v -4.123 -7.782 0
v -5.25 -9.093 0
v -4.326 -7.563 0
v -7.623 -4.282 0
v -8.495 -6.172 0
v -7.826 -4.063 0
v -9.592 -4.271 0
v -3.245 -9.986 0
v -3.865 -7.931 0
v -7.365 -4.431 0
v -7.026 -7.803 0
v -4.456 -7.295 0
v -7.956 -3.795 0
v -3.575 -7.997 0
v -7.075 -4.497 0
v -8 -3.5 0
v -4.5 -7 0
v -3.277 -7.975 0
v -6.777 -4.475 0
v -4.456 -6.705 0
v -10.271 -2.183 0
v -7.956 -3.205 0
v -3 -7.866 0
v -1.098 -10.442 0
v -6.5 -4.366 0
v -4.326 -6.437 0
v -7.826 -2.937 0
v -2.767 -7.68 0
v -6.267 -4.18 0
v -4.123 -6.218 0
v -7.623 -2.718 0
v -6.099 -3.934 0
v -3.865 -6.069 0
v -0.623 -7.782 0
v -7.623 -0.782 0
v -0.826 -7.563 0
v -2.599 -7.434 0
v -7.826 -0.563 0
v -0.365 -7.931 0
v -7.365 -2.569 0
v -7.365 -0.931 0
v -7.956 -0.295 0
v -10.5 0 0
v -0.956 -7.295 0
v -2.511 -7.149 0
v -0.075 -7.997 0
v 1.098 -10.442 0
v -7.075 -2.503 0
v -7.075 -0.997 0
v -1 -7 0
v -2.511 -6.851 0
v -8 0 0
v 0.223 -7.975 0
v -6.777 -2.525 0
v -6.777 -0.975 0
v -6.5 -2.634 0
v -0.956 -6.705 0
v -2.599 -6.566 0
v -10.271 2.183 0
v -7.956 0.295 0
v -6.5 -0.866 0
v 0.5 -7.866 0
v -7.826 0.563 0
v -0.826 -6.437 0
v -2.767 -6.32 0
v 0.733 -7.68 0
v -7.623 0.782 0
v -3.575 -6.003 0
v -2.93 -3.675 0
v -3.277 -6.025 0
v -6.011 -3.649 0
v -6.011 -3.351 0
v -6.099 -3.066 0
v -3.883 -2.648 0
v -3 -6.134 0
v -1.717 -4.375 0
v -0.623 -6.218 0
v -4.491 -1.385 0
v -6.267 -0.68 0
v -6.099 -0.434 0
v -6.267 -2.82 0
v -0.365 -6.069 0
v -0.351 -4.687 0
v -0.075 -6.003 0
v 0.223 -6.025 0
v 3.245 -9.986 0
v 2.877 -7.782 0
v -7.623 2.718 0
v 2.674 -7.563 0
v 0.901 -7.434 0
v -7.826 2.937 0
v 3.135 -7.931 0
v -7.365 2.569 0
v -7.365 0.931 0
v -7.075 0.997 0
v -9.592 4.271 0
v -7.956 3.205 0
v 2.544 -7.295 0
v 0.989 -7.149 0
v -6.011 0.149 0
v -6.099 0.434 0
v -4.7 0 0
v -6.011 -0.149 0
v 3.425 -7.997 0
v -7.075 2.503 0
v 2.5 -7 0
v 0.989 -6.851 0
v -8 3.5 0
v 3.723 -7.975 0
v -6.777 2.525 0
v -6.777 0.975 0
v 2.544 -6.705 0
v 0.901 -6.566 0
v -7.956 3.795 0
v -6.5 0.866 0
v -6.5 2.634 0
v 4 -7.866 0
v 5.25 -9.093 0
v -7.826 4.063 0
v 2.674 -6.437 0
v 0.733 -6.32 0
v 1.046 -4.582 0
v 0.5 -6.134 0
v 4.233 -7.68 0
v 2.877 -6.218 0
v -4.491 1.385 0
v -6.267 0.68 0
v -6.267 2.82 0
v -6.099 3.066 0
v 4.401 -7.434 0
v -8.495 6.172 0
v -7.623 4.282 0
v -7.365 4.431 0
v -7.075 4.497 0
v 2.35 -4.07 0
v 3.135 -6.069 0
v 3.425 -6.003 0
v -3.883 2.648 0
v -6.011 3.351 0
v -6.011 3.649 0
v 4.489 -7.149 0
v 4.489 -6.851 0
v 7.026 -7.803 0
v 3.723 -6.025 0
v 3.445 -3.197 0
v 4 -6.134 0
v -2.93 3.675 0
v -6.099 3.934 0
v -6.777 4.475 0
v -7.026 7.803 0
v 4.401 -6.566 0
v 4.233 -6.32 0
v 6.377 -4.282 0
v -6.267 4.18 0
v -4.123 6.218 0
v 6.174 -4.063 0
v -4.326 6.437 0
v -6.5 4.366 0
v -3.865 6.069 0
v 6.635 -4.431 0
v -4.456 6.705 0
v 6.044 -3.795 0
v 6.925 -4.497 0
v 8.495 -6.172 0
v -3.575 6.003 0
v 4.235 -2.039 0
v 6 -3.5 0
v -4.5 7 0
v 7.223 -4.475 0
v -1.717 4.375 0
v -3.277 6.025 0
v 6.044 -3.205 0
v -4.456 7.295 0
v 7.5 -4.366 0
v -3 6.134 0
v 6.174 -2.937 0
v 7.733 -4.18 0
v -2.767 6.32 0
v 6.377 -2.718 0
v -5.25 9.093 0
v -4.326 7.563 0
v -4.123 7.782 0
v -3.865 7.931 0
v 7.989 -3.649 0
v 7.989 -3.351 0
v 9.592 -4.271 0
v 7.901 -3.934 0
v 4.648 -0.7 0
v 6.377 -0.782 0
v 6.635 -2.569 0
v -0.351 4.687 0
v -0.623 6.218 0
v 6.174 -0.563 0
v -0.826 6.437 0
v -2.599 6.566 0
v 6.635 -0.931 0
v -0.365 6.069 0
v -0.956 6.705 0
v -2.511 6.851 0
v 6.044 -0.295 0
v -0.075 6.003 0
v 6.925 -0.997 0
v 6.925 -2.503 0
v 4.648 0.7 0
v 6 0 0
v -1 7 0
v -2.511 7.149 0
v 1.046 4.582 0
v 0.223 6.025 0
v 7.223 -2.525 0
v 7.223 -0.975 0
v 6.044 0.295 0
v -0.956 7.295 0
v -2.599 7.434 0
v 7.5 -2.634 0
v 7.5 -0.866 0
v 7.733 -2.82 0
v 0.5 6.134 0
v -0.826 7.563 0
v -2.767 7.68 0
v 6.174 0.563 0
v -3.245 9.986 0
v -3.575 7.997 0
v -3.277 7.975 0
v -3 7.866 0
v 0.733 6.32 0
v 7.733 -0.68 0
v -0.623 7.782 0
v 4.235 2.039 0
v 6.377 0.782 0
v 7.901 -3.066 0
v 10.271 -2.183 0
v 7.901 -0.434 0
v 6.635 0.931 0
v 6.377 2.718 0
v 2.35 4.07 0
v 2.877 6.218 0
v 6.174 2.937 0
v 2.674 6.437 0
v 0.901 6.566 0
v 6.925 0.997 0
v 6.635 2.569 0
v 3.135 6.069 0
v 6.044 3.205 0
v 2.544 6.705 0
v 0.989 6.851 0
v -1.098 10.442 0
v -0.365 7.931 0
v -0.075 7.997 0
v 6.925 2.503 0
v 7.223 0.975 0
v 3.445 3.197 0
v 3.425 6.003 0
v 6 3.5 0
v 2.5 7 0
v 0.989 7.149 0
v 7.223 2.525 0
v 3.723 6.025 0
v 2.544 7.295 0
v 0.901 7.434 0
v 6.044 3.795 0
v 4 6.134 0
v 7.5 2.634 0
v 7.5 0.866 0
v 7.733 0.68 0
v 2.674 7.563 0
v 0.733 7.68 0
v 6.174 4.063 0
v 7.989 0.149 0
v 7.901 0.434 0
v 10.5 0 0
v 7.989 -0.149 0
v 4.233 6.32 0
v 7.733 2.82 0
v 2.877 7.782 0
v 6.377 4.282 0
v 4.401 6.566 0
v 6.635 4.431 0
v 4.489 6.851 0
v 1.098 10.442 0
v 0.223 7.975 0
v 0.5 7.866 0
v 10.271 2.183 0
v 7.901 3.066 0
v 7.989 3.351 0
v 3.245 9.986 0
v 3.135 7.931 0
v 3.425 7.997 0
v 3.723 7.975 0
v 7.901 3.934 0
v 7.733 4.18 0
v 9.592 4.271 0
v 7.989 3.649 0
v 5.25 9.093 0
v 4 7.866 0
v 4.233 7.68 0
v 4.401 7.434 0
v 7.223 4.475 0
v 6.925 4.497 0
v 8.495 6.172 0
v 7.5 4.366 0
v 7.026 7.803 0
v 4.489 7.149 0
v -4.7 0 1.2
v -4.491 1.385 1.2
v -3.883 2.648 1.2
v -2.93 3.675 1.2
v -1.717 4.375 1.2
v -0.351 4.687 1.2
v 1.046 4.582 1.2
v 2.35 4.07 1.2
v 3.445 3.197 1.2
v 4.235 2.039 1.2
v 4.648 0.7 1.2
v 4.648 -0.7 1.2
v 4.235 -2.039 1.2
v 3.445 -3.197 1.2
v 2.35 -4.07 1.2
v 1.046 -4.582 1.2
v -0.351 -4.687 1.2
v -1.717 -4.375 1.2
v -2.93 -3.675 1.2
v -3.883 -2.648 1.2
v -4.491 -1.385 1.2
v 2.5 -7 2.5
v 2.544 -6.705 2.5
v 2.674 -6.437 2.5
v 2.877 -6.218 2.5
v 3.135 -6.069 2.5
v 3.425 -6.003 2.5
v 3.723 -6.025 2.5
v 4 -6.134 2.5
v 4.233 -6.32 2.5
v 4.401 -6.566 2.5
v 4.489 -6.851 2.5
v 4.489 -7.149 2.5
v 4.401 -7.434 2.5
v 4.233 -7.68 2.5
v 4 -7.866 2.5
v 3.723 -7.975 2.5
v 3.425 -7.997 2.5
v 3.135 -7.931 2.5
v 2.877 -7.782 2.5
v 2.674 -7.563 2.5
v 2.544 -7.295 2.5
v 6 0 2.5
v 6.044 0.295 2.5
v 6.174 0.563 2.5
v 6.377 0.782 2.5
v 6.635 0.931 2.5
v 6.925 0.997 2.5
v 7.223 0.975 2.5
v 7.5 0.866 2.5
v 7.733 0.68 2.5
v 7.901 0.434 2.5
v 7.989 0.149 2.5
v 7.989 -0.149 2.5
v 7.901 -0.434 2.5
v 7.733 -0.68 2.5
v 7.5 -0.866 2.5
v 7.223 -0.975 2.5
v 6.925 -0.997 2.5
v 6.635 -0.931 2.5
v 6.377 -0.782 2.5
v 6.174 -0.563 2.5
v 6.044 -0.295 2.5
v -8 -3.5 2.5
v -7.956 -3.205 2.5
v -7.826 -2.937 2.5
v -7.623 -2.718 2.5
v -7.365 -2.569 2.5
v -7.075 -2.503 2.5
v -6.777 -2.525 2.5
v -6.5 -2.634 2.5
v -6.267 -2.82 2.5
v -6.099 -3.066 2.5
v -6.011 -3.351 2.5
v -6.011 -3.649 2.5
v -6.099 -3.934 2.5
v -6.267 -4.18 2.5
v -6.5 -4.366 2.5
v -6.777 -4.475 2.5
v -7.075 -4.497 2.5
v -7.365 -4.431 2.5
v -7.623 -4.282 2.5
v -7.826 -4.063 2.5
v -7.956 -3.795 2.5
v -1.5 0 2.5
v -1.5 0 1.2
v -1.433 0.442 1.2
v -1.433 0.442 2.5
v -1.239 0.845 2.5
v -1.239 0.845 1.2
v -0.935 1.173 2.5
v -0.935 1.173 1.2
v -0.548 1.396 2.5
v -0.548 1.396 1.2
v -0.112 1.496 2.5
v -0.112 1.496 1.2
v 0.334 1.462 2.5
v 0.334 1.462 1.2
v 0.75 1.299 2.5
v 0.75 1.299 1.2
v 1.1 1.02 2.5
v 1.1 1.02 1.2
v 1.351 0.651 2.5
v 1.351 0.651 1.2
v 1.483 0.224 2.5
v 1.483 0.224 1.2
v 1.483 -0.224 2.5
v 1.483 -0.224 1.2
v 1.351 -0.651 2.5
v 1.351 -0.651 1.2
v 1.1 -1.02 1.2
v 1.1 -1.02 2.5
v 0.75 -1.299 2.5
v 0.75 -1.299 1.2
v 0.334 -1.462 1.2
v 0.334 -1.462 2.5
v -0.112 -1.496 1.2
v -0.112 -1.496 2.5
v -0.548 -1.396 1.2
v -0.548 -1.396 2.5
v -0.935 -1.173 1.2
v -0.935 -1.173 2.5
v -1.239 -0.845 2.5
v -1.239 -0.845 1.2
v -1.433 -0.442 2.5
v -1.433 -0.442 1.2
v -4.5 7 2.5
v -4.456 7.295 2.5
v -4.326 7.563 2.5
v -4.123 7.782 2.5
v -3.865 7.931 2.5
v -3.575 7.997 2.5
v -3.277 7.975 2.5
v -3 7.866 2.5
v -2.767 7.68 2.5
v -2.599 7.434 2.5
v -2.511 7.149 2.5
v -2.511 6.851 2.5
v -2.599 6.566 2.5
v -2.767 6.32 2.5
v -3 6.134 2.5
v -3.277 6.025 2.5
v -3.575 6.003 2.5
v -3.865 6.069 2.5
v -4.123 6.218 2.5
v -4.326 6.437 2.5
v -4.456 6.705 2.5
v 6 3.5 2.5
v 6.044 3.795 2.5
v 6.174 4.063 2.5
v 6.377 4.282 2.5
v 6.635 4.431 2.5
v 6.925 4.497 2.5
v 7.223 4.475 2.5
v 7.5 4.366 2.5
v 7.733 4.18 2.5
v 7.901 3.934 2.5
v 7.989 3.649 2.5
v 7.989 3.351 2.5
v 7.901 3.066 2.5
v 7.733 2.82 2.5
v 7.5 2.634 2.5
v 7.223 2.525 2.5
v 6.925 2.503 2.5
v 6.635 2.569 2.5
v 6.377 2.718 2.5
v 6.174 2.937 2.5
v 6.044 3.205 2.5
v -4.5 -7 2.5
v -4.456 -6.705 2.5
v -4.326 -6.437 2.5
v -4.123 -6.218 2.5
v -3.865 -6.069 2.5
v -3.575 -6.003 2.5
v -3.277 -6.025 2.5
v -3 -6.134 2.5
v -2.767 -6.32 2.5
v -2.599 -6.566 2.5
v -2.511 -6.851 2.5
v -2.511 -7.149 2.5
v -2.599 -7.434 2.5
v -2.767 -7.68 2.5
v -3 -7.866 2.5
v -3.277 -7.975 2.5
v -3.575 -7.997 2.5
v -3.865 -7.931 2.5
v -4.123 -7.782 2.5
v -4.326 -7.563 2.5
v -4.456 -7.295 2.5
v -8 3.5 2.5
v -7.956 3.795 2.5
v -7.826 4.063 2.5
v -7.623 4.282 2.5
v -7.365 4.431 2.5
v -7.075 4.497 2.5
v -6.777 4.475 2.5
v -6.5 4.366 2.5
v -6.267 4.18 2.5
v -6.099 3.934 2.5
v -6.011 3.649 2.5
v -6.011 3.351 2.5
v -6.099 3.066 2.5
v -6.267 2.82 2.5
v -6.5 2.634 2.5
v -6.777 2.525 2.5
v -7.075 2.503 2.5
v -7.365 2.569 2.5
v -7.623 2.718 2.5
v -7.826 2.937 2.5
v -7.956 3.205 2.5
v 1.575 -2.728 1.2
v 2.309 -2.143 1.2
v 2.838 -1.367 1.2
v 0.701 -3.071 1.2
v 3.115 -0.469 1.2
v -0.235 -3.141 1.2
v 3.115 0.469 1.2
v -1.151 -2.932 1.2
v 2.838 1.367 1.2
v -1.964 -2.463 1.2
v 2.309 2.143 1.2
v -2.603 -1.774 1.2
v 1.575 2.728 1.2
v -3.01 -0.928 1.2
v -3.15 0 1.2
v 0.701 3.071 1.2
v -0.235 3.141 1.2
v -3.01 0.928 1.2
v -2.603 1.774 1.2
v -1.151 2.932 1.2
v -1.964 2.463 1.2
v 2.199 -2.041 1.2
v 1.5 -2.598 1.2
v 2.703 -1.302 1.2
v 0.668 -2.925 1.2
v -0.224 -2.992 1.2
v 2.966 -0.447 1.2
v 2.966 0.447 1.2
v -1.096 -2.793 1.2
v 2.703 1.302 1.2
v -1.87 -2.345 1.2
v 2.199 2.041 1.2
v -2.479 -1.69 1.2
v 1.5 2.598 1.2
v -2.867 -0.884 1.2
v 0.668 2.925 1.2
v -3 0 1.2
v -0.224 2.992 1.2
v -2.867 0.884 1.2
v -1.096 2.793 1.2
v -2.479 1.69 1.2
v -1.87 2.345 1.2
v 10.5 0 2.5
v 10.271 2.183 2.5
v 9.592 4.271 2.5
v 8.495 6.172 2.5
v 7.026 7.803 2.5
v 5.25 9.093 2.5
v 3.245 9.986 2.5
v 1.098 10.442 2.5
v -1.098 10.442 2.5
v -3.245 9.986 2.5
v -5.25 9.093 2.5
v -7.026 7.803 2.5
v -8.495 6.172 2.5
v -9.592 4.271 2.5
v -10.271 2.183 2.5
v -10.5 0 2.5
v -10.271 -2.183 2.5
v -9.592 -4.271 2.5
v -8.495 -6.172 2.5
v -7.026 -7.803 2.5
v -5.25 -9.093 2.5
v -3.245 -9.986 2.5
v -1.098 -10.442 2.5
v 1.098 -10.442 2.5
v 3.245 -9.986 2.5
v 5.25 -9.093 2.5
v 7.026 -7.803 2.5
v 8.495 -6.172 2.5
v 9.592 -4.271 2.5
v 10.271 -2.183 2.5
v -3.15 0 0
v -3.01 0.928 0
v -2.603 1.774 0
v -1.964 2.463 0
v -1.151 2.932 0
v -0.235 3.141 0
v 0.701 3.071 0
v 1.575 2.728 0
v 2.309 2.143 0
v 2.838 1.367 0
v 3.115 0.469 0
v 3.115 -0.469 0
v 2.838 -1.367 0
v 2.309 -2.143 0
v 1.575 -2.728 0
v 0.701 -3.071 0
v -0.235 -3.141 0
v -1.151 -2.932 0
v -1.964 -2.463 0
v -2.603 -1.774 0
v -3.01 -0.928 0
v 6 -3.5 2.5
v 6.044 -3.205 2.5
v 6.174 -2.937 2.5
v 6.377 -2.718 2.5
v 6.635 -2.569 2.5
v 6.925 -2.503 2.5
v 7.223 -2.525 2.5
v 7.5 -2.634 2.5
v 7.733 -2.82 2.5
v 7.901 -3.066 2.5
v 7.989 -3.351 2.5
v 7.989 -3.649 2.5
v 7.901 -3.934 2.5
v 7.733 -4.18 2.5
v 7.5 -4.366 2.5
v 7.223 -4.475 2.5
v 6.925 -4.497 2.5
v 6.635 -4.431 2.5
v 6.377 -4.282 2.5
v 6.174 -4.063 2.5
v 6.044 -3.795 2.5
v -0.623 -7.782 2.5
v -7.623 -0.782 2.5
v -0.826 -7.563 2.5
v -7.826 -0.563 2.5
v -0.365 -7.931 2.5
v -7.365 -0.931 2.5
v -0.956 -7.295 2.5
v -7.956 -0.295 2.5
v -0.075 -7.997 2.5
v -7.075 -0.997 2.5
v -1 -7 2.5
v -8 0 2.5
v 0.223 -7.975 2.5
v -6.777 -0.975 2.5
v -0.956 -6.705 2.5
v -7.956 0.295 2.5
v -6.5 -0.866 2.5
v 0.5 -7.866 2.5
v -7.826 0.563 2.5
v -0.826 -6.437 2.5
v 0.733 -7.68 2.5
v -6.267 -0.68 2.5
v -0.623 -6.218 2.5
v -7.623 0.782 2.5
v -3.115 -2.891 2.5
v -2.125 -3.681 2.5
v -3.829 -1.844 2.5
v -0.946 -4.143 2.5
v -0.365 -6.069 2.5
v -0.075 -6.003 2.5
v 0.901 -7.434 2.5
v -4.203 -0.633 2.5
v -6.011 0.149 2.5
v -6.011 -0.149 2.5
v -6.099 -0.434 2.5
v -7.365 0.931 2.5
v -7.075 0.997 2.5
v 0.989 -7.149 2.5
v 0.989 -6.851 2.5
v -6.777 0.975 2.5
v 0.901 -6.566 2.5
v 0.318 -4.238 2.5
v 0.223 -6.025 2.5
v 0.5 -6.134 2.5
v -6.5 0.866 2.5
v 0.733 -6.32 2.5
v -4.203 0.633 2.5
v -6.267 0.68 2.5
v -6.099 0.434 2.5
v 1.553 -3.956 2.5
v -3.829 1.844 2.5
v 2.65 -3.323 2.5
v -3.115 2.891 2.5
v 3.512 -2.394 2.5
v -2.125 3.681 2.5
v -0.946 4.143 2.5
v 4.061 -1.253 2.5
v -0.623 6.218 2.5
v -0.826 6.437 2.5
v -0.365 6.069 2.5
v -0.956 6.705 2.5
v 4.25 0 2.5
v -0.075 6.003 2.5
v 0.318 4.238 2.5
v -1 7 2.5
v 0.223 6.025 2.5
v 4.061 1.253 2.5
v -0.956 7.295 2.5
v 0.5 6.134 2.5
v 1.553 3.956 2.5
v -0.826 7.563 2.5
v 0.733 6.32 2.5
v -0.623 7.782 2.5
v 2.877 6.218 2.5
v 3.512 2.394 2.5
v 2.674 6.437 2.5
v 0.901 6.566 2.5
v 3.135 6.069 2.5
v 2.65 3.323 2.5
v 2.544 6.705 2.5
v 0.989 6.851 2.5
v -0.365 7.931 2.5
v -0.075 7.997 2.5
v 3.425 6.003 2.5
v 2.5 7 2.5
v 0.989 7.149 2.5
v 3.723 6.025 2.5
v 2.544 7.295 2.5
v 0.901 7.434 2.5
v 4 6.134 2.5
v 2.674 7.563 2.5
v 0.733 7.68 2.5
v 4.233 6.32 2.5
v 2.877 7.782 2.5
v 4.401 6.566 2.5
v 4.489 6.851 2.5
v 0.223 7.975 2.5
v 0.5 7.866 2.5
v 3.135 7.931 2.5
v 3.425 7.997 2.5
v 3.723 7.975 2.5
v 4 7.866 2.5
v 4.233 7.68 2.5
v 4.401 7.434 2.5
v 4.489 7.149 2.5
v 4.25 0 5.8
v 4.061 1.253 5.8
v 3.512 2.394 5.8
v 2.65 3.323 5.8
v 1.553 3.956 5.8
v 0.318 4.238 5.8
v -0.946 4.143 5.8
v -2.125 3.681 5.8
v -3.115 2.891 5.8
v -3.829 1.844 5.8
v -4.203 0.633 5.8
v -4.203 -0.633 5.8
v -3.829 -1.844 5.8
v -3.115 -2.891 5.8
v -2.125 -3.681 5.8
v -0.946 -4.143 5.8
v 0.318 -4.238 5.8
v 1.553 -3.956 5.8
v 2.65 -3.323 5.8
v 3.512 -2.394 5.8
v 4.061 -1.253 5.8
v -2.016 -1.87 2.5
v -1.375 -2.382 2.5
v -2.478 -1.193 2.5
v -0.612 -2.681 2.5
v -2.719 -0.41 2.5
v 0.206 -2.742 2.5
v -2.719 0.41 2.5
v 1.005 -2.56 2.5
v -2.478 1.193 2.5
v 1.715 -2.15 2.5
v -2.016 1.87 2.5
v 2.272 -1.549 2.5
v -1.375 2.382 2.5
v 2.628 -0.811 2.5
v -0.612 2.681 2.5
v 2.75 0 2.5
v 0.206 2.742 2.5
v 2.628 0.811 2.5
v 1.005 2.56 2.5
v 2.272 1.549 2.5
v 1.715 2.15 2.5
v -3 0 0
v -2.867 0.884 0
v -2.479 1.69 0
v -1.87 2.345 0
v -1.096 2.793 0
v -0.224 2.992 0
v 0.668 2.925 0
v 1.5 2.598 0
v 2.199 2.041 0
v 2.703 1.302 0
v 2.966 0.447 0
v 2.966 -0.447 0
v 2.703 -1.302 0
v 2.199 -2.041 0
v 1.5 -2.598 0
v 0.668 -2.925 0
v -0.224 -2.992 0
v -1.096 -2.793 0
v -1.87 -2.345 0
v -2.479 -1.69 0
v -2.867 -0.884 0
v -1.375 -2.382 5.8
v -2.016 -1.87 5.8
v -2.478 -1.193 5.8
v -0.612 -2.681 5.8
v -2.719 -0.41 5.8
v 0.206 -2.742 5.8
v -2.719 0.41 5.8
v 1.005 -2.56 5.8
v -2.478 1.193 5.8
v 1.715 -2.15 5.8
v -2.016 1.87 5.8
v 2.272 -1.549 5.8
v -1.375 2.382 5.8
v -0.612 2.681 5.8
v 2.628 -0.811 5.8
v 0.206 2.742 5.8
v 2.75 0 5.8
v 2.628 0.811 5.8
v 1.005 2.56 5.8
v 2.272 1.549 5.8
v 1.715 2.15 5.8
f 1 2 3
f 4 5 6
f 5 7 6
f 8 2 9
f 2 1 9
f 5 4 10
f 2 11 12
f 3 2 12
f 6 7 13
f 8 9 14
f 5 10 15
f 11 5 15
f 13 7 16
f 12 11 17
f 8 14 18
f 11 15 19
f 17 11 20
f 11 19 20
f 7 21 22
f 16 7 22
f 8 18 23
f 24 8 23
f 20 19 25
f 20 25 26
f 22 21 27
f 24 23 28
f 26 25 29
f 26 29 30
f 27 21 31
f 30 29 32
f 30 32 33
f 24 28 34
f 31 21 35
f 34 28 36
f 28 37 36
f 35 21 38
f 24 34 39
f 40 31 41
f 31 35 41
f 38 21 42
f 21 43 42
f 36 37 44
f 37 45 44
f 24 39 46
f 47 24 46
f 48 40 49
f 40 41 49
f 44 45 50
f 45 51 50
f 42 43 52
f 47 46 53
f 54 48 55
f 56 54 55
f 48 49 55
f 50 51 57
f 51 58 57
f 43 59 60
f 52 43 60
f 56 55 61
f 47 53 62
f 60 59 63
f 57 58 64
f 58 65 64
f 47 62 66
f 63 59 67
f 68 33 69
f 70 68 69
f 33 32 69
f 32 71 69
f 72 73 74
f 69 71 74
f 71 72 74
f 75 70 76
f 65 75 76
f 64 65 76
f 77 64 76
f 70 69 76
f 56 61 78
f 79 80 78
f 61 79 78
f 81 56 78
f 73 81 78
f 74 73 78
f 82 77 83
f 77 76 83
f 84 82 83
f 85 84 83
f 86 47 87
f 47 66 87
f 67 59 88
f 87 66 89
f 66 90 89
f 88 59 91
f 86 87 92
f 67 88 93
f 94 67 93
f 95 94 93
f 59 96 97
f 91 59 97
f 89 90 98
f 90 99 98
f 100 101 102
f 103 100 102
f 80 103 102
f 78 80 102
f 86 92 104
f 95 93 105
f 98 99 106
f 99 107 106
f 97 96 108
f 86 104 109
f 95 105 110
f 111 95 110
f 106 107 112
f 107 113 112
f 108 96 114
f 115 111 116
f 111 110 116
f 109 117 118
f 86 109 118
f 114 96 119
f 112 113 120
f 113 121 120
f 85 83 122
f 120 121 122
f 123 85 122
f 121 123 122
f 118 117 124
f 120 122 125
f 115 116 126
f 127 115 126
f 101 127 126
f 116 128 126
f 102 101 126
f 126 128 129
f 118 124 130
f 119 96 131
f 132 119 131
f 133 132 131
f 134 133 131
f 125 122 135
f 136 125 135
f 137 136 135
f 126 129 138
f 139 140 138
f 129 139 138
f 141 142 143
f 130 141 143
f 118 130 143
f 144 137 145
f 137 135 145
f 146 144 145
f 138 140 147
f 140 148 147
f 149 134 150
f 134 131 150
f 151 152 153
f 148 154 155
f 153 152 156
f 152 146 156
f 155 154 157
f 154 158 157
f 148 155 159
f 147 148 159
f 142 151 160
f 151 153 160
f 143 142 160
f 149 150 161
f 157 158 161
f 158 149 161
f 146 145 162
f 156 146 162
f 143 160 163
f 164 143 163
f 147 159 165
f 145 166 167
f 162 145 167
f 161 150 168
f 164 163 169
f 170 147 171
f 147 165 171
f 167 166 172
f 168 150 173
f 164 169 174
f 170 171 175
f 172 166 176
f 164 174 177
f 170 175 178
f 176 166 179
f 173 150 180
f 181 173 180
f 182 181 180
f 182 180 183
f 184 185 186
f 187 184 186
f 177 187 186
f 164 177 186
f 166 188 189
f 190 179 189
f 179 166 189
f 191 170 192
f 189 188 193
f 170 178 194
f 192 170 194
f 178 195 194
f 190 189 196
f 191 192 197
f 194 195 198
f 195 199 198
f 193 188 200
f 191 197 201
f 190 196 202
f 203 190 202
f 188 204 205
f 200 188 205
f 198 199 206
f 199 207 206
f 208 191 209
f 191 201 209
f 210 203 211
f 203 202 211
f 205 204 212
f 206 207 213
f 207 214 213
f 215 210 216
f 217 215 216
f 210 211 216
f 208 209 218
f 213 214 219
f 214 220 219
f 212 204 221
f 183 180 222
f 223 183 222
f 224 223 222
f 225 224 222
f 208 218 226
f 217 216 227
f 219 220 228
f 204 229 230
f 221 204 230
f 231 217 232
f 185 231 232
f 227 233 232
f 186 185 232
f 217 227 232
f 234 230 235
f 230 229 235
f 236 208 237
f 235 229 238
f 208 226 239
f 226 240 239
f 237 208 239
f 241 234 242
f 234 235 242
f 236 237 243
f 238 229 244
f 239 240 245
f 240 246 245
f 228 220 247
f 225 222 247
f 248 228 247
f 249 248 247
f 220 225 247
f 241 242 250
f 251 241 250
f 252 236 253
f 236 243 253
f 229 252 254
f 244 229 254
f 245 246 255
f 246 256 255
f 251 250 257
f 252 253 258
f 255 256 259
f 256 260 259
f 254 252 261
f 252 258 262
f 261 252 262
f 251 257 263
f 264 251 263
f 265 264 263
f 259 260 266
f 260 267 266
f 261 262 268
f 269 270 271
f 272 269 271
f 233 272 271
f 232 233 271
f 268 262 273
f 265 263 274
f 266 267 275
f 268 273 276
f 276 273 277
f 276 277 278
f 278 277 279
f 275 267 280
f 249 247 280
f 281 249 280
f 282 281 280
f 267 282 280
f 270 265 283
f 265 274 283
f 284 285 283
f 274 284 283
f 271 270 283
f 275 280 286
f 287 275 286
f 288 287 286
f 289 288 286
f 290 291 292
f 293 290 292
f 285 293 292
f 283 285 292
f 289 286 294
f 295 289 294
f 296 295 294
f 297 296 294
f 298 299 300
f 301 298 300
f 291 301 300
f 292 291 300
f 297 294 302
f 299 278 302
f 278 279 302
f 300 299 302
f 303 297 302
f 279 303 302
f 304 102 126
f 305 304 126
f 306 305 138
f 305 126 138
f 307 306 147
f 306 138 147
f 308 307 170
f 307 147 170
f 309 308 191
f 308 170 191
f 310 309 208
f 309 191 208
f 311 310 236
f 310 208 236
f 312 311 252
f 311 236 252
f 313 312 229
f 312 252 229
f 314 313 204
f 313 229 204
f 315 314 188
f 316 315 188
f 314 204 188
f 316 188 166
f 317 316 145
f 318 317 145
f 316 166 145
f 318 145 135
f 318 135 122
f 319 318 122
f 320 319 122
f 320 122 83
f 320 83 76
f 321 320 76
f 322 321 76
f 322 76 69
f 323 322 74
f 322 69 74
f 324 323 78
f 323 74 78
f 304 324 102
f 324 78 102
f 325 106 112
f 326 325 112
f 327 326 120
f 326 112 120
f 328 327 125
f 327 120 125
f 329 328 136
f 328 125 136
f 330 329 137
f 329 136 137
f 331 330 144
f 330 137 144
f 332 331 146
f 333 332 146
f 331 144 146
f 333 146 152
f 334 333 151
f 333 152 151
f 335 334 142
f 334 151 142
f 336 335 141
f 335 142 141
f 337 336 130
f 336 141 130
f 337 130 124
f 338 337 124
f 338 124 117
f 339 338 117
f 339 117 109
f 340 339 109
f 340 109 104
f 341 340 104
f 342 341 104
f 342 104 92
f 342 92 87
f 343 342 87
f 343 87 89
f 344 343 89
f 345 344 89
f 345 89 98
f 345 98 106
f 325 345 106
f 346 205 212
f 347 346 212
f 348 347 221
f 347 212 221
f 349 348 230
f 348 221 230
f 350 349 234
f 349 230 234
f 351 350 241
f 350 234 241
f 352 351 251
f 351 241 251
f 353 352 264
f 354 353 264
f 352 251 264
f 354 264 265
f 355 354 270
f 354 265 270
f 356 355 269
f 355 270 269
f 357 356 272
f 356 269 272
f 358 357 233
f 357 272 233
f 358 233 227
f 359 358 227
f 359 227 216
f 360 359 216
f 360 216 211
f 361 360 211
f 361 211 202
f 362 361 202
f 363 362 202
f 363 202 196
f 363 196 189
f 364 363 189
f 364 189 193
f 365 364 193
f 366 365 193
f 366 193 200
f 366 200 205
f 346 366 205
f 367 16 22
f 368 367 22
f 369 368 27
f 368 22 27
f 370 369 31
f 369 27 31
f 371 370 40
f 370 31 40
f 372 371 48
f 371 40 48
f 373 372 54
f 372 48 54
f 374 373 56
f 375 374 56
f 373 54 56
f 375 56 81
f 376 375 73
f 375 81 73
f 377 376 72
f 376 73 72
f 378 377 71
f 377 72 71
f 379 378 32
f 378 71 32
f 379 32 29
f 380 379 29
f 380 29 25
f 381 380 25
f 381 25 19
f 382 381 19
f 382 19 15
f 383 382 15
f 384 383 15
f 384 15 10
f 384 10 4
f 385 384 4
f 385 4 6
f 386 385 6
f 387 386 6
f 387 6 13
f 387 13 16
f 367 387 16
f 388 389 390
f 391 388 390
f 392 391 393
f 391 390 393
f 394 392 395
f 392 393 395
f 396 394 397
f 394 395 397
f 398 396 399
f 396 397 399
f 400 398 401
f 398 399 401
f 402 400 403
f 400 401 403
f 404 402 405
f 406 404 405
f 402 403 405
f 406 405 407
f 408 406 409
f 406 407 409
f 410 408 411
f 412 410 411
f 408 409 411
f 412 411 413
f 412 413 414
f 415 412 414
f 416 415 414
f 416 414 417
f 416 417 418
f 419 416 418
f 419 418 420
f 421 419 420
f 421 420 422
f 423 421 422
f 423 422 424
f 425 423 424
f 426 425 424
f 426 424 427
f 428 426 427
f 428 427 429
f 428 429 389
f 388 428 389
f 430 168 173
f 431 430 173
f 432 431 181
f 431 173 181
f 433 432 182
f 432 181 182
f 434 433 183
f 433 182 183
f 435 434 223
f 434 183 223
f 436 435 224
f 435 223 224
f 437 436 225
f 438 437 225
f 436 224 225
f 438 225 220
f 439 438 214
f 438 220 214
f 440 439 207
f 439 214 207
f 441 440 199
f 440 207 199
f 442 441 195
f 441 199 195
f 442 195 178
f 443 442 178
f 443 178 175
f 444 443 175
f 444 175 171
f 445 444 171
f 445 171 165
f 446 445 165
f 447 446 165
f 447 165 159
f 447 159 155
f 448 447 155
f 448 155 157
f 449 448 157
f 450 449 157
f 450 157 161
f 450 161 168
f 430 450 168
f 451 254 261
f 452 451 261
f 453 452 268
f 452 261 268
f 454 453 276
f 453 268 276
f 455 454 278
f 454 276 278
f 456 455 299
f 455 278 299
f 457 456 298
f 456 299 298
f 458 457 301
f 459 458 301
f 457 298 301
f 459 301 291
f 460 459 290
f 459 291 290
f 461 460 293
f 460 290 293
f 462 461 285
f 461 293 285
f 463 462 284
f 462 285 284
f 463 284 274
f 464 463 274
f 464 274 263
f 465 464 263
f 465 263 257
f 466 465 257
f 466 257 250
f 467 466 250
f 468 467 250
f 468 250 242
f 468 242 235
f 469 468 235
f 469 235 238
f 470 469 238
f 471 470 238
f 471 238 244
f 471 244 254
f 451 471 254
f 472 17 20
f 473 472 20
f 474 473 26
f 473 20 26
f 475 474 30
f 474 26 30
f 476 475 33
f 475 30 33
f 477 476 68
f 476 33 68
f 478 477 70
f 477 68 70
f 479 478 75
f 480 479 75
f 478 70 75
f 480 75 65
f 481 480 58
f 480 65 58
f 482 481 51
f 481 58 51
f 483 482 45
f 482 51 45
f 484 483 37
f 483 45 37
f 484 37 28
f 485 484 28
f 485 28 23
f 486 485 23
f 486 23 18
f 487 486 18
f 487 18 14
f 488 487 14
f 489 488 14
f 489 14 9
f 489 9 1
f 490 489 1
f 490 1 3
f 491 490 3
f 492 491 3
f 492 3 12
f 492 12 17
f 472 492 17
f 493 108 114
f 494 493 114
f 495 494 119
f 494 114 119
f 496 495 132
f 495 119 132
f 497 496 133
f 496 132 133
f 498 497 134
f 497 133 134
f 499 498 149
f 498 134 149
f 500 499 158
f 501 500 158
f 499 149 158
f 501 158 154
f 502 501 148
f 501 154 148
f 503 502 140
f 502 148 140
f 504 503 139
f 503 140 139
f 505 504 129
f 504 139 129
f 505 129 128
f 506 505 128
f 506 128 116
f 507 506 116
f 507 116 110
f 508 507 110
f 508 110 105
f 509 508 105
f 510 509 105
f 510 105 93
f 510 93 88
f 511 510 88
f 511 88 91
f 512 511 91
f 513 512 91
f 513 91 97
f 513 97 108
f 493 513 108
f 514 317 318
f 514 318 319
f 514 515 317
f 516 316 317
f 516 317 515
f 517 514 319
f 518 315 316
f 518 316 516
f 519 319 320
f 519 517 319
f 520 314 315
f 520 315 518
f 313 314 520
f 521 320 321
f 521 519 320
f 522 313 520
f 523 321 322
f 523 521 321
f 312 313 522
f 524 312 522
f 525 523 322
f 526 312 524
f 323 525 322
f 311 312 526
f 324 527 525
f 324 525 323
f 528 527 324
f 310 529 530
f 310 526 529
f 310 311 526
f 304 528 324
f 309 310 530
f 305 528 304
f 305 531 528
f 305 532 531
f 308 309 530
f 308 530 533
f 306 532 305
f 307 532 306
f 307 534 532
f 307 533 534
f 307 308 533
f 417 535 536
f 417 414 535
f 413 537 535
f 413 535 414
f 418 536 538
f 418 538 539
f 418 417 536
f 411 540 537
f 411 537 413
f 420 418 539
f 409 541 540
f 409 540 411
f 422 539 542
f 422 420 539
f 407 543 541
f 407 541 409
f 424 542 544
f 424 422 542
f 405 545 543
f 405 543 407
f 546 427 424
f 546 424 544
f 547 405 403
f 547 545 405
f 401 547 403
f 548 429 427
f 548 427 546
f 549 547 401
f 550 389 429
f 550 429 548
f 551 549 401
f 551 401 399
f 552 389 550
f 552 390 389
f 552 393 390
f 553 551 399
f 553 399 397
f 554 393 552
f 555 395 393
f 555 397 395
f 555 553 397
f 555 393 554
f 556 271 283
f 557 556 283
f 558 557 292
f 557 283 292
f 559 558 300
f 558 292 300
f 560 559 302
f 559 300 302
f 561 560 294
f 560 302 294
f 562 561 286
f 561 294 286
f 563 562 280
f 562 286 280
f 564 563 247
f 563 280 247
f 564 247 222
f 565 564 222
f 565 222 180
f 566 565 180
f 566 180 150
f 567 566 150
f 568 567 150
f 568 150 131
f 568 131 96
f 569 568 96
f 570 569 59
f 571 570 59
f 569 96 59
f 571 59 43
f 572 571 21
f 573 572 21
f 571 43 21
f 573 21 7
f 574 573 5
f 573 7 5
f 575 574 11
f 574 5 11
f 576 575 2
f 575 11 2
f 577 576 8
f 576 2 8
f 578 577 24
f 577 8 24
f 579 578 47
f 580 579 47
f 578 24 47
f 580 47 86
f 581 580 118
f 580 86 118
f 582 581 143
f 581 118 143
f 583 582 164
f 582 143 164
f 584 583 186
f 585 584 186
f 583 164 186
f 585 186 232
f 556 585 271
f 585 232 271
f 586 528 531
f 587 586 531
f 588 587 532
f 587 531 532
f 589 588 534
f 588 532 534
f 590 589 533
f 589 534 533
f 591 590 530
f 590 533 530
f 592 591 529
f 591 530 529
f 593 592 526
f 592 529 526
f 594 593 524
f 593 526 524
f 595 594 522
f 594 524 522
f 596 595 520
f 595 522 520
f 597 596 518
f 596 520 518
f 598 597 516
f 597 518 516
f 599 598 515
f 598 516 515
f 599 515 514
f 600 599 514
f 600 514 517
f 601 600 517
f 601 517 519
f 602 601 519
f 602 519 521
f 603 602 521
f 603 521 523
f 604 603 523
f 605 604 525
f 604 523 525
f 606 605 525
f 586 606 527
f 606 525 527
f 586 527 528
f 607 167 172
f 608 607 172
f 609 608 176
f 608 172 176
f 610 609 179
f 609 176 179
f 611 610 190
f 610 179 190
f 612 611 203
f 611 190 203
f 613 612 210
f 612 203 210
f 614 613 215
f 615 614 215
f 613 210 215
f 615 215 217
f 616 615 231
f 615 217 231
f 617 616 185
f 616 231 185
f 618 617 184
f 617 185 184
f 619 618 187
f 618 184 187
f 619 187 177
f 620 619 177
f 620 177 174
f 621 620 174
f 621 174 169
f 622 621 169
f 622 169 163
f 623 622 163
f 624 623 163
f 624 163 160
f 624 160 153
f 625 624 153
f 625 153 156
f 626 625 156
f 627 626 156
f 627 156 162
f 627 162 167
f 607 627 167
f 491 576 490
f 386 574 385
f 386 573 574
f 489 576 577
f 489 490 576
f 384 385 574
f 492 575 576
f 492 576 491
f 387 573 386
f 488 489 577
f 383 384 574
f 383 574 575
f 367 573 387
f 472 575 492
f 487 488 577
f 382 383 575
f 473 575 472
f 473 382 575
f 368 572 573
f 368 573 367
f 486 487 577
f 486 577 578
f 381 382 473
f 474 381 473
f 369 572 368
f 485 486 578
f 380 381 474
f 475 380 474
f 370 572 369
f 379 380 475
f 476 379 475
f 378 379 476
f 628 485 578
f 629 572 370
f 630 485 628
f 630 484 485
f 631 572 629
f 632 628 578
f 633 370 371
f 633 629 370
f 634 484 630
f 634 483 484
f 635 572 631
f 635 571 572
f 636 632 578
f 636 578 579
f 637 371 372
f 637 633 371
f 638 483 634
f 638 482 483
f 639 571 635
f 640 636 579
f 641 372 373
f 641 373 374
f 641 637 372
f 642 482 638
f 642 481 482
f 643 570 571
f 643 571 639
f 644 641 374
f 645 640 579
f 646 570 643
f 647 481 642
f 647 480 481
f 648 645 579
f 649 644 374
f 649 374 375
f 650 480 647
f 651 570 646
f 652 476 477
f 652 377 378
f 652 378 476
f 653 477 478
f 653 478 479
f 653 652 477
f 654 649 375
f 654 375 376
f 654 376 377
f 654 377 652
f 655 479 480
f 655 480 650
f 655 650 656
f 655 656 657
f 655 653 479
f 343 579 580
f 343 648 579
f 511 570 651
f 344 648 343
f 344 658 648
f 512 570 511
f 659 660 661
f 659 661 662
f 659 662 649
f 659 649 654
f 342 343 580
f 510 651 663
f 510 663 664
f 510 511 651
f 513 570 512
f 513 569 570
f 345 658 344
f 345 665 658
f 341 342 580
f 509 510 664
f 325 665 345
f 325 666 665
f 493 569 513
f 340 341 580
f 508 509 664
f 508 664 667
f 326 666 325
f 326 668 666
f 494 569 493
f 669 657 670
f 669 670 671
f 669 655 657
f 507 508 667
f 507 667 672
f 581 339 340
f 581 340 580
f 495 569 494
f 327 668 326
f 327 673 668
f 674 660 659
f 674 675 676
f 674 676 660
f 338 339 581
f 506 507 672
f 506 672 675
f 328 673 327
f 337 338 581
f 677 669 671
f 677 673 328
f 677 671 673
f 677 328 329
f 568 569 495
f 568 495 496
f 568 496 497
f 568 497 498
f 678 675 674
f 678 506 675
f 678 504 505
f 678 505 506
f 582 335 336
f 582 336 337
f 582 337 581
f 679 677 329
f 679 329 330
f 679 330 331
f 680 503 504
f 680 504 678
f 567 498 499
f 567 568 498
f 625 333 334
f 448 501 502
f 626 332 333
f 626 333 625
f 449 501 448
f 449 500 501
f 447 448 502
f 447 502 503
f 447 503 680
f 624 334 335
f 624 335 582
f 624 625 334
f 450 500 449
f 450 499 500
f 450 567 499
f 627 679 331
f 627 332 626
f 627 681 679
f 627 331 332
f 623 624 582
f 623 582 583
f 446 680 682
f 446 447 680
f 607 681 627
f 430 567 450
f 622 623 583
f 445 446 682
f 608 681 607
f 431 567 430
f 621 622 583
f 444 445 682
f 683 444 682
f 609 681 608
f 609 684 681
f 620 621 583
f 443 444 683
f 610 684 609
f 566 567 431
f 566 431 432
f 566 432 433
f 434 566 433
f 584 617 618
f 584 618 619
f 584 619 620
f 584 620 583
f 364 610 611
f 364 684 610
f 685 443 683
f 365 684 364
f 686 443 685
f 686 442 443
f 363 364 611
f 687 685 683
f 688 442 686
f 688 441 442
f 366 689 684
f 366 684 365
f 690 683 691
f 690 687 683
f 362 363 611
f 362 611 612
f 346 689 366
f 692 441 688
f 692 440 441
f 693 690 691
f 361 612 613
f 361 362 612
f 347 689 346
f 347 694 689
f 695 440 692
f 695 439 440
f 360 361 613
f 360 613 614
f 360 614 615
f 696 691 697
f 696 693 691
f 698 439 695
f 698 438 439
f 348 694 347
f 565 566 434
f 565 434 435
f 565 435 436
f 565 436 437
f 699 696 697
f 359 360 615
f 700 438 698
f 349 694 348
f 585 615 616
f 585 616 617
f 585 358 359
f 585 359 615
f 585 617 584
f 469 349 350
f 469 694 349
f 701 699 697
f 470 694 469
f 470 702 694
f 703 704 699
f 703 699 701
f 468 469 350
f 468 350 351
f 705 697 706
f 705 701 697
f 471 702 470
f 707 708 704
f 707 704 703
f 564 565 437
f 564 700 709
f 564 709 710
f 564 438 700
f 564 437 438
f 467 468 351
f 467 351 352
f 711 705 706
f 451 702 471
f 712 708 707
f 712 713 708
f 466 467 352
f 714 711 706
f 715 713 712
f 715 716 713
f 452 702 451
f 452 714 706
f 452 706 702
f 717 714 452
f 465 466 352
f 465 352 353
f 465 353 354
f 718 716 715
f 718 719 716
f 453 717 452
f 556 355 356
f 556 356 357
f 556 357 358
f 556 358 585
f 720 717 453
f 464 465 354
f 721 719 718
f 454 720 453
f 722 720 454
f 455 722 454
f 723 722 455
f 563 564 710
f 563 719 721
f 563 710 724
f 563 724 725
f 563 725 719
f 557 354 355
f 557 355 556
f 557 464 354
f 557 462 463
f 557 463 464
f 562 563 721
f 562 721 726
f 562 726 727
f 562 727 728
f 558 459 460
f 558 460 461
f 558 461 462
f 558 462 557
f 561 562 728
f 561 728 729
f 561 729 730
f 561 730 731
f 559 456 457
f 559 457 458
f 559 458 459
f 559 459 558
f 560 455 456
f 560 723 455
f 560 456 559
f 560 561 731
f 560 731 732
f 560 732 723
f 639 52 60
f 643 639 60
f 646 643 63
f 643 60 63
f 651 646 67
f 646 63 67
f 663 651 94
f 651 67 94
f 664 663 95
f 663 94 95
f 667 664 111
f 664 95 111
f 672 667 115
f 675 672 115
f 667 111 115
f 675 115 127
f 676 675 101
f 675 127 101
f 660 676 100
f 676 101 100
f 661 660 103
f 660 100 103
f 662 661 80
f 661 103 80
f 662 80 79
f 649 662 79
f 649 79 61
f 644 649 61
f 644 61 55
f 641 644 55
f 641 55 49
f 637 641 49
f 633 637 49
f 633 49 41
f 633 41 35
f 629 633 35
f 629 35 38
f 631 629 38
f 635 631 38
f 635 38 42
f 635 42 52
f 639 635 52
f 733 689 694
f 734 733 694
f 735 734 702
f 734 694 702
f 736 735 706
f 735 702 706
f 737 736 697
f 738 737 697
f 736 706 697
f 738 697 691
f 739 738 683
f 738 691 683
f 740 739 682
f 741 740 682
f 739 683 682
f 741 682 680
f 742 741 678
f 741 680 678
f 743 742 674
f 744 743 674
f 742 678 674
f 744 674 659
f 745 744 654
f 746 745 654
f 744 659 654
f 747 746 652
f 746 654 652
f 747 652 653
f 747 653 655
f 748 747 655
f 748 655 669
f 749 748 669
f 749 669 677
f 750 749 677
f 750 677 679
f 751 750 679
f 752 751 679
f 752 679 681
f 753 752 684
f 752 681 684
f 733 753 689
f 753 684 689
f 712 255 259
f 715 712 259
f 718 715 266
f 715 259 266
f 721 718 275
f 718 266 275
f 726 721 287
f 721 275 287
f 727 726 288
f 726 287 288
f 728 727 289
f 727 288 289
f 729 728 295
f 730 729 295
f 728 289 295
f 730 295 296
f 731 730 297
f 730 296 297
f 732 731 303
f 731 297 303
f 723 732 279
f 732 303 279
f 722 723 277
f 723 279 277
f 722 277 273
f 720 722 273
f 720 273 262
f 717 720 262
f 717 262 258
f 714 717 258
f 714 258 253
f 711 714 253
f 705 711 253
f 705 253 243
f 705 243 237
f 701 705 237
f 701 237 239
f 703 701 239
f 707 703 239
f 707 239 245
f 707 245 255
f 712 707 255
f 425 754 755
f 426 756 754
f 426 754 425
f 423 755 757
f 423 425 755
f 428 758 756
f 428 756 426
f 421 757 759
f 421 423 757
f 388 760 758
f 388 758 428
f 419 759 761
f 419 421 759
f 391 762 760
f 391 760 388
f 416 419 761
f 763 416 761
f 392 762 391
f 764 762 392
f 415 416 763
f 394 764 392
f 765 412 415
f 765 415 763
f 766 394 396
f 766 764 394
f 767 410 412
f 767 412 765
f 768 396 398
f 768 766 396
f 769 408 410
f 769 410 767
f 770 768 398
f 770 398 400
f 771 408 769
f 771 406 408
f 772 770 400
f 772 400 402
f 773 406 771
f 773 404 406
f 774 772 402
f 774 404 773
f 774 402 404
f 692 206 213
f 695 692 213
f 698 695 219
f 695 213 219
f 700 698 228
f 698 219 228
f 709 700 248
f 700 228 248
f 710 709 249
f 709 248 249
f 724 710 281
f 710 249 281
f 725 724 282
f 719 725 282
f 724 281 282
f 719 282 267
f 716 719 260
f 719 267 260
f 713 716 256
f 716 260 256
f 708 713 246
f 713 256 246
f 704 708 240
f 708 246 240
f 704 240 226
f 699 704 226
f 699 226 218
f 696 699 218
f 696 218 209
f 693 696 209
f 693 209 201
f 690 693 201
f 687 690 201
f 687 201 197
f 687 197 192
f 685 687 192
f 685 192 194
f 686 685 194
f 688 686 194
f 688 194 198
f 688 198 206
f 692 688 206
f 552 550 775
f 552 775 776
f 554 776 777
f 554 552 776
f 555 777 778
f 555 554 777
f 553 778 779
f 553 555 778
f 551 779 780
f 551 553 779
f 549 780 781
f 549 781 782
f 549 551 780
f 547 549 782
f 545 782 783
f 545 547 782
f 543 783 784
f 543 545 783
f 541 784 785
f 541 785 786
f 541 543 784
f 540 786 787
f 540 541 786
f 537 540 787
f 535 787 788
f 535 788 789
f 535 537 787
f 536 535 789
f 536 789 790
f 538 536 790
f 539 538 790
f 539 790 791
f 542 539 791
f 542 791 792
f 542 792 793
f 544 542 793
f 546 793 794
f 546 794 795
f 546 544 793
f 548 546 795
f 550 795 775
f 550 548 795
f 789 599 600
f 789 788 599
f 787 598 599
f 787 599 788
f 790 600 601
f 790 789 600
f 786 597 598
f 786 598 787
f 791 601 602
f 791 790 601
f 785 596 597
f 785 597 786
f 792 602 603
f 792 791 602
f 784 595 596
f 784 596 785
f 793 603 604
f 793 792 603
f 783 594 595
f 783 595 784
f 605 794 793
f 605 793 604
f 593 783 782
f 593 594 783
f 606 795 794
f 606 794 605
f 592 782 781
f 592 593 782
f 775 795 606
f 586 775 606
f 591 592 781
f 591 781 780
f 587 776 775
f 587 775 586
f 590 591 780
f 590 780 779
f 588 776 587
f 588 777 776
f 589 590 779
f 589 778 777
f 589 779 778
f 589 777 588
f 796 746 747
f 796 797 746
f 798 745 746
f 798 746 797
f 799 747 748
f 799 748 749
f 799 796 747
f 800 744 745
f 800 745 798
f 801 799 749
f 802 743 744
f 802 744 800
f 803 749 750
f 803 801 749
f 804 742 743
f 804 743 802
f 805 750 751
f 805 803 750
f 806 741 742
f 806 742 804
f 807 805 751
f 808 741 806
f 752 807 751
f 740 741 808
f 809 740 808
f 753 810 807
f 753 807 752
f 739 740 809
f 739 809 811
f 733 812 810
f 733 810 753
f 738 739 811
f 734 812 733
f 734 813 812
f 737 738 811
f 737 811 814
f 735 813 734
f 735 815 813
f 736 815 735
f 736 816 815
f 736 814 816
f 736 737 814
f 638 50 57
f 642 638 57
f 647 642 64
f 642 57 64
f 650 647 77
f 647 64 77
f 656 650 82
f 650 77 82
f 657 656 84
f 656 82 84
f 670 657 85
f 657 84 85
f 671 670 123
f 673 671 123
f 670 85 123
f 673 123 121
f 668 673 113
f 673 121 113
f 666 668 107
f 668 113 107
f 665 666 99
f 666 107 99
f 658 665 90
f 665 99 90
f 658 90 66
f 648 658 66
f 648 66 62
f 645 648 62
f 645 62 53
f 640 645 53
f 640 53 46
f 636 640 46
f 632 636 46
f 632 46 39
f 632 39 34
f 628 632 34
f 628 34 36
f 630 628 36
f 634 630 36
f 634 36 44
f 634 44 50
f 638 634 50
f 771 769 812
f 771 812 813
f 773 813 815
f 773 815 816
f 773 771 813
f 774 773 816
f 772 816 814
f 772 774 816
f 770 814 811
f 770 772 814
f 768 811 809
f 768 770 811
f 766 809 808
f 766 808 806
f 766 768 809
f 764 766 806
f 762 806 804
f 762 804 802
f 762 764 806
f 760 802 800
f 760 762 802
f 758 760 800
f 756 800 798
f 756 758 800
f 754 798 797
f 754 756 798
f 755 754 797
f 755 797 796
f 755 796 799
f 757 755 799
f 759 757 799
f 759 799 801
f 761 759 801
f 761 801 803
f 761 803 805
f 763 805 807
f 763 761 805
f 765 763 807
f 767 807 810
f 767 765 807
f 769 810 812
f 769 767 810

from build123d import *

# Parameters (mm, degrees)
SKETCH1_R           = 10.5
BOSS_EXTRUDE1_DEPTH = 2.5
SKETCH2_R           = 4.25
SKETCH2_R_2         = 2.75
BOSS_EXTRUDE2_DEPTH = 3.3
SKETCH3_R           = 1.5
CUT_EXTRUDE1_DEPTH  = 16.941769036
SKETCH3_3_R         = 4.7
SKETCH3_3_R_2       = 1.5
CUT_EXTRUDE2_DEPTH  = 1.2
SKETCH4_R           = 3.15
SKETCH4_R_2         = 3
BOSS_EXTRUDE3_DEPTH = 1.2
SKETCH5_R           = 1
CUT_EXTRUDE3_DEPTH  = 16.941769036


with BuildPart() as part:
    # Sketch1 → Boss-Extrude1 (new body)
    with BuildSketch(Plane.XY):
        Circle(SKETCH1_R)
    extrude(amount=BOSS_EXTRUDE1_DEPTH)

    # Sketch2 → Boss-Extrude2 (add)
    with BuildSketch(Plane.XY.offset(2.5)):
        Circle(SKETCH2_R)
        Circle(SKETCH2_R_2, mode=Mode.SUBTRACT)
    extrude(amount=BOSS_EXTRUDE2_DEPTH)

    # Sketch3 → Cut-Extrude1 (cut, through all)
    with BuildSketch(Plane(origin=(0, 0, 0), x_dir=(-1, 0, 0), z_dir=(0, 0, -1))):
        Circle(SKETCH3_R)
    extrude(amount=-CUT_EXTRUDE1_DEPTH, mode=Mode.SUBTRACT)

    # Sketch3<3> → Cut-Extrude2 (cut)
    with BuildSketch(Plane(origin=(0, 0, 0), x_dir=(-1, 0, 0), z_dir=(0, 0, -1))):
        Circle(SKETCH3_3_R)
        Circle(SKETCH3_3_R_2, mode=Mode.SUBTRACT)
    extrude(amount=-CUT_EXTRUDE2_DEPTH, mode=Mode.SUBTRACT)

    # Sketch4 → Boss-Extrude3 (add)
    with BuildSketch(Plane(origin=(0, 0, 1.2), x_dir=(-1, 0, 0), z_dir=(0, 0, -1))):
        Circle(SKETCH4_R)
        Circle(SKETCH4_R_2, mode=Mode.SUBTRACT)
    extrude(amount=BOSS_EXTRUDE3_DEPTH)

    # Sketch5 → Cut-Extrude3 (cut, through all)
    with BuildSketch(Plane(origin=(0, 0, 0), x_dir=(-1, 0, 0), z_dir=(0, 0, -1))):
        with Locations((0, 7)):
            Circle(SKETCH5_R)
        with Locations((0, -7)):
            Circle(SKETCH5_R)
        with Locations((-7, 0)):
            Circle(SKETCH5_R)
        with Locations((7, 0)):
            Circle(SKETCH5_R)
        with Locations((3.5, 7)):
            Circle(SKETCH5_R)
        with Locations((-3.5, 7)):
            Circle(SKETCH5_R)
        with Locations((-7, 3.5)):
            Circle(SKETCH5_R)
        with Locations((-7, -3.5)):
            Circle(SKETCH5_R)
        with Locations((7, -3.5)):
            Circle(SKETCH5_R)
        with Locations((7, 3.5)):
            Circle(SKETCH5_R)
        with Locations((-3.5, -7)):
            Circle(SKETCH5_R)
        with Locations((3.5, -7)):
            Circle(SKETCH5_R)
    extrude(amount=-CUT_EXTRUDE3_DEPTH, mode=Mode.SUBTRACT)


solid = part.part
